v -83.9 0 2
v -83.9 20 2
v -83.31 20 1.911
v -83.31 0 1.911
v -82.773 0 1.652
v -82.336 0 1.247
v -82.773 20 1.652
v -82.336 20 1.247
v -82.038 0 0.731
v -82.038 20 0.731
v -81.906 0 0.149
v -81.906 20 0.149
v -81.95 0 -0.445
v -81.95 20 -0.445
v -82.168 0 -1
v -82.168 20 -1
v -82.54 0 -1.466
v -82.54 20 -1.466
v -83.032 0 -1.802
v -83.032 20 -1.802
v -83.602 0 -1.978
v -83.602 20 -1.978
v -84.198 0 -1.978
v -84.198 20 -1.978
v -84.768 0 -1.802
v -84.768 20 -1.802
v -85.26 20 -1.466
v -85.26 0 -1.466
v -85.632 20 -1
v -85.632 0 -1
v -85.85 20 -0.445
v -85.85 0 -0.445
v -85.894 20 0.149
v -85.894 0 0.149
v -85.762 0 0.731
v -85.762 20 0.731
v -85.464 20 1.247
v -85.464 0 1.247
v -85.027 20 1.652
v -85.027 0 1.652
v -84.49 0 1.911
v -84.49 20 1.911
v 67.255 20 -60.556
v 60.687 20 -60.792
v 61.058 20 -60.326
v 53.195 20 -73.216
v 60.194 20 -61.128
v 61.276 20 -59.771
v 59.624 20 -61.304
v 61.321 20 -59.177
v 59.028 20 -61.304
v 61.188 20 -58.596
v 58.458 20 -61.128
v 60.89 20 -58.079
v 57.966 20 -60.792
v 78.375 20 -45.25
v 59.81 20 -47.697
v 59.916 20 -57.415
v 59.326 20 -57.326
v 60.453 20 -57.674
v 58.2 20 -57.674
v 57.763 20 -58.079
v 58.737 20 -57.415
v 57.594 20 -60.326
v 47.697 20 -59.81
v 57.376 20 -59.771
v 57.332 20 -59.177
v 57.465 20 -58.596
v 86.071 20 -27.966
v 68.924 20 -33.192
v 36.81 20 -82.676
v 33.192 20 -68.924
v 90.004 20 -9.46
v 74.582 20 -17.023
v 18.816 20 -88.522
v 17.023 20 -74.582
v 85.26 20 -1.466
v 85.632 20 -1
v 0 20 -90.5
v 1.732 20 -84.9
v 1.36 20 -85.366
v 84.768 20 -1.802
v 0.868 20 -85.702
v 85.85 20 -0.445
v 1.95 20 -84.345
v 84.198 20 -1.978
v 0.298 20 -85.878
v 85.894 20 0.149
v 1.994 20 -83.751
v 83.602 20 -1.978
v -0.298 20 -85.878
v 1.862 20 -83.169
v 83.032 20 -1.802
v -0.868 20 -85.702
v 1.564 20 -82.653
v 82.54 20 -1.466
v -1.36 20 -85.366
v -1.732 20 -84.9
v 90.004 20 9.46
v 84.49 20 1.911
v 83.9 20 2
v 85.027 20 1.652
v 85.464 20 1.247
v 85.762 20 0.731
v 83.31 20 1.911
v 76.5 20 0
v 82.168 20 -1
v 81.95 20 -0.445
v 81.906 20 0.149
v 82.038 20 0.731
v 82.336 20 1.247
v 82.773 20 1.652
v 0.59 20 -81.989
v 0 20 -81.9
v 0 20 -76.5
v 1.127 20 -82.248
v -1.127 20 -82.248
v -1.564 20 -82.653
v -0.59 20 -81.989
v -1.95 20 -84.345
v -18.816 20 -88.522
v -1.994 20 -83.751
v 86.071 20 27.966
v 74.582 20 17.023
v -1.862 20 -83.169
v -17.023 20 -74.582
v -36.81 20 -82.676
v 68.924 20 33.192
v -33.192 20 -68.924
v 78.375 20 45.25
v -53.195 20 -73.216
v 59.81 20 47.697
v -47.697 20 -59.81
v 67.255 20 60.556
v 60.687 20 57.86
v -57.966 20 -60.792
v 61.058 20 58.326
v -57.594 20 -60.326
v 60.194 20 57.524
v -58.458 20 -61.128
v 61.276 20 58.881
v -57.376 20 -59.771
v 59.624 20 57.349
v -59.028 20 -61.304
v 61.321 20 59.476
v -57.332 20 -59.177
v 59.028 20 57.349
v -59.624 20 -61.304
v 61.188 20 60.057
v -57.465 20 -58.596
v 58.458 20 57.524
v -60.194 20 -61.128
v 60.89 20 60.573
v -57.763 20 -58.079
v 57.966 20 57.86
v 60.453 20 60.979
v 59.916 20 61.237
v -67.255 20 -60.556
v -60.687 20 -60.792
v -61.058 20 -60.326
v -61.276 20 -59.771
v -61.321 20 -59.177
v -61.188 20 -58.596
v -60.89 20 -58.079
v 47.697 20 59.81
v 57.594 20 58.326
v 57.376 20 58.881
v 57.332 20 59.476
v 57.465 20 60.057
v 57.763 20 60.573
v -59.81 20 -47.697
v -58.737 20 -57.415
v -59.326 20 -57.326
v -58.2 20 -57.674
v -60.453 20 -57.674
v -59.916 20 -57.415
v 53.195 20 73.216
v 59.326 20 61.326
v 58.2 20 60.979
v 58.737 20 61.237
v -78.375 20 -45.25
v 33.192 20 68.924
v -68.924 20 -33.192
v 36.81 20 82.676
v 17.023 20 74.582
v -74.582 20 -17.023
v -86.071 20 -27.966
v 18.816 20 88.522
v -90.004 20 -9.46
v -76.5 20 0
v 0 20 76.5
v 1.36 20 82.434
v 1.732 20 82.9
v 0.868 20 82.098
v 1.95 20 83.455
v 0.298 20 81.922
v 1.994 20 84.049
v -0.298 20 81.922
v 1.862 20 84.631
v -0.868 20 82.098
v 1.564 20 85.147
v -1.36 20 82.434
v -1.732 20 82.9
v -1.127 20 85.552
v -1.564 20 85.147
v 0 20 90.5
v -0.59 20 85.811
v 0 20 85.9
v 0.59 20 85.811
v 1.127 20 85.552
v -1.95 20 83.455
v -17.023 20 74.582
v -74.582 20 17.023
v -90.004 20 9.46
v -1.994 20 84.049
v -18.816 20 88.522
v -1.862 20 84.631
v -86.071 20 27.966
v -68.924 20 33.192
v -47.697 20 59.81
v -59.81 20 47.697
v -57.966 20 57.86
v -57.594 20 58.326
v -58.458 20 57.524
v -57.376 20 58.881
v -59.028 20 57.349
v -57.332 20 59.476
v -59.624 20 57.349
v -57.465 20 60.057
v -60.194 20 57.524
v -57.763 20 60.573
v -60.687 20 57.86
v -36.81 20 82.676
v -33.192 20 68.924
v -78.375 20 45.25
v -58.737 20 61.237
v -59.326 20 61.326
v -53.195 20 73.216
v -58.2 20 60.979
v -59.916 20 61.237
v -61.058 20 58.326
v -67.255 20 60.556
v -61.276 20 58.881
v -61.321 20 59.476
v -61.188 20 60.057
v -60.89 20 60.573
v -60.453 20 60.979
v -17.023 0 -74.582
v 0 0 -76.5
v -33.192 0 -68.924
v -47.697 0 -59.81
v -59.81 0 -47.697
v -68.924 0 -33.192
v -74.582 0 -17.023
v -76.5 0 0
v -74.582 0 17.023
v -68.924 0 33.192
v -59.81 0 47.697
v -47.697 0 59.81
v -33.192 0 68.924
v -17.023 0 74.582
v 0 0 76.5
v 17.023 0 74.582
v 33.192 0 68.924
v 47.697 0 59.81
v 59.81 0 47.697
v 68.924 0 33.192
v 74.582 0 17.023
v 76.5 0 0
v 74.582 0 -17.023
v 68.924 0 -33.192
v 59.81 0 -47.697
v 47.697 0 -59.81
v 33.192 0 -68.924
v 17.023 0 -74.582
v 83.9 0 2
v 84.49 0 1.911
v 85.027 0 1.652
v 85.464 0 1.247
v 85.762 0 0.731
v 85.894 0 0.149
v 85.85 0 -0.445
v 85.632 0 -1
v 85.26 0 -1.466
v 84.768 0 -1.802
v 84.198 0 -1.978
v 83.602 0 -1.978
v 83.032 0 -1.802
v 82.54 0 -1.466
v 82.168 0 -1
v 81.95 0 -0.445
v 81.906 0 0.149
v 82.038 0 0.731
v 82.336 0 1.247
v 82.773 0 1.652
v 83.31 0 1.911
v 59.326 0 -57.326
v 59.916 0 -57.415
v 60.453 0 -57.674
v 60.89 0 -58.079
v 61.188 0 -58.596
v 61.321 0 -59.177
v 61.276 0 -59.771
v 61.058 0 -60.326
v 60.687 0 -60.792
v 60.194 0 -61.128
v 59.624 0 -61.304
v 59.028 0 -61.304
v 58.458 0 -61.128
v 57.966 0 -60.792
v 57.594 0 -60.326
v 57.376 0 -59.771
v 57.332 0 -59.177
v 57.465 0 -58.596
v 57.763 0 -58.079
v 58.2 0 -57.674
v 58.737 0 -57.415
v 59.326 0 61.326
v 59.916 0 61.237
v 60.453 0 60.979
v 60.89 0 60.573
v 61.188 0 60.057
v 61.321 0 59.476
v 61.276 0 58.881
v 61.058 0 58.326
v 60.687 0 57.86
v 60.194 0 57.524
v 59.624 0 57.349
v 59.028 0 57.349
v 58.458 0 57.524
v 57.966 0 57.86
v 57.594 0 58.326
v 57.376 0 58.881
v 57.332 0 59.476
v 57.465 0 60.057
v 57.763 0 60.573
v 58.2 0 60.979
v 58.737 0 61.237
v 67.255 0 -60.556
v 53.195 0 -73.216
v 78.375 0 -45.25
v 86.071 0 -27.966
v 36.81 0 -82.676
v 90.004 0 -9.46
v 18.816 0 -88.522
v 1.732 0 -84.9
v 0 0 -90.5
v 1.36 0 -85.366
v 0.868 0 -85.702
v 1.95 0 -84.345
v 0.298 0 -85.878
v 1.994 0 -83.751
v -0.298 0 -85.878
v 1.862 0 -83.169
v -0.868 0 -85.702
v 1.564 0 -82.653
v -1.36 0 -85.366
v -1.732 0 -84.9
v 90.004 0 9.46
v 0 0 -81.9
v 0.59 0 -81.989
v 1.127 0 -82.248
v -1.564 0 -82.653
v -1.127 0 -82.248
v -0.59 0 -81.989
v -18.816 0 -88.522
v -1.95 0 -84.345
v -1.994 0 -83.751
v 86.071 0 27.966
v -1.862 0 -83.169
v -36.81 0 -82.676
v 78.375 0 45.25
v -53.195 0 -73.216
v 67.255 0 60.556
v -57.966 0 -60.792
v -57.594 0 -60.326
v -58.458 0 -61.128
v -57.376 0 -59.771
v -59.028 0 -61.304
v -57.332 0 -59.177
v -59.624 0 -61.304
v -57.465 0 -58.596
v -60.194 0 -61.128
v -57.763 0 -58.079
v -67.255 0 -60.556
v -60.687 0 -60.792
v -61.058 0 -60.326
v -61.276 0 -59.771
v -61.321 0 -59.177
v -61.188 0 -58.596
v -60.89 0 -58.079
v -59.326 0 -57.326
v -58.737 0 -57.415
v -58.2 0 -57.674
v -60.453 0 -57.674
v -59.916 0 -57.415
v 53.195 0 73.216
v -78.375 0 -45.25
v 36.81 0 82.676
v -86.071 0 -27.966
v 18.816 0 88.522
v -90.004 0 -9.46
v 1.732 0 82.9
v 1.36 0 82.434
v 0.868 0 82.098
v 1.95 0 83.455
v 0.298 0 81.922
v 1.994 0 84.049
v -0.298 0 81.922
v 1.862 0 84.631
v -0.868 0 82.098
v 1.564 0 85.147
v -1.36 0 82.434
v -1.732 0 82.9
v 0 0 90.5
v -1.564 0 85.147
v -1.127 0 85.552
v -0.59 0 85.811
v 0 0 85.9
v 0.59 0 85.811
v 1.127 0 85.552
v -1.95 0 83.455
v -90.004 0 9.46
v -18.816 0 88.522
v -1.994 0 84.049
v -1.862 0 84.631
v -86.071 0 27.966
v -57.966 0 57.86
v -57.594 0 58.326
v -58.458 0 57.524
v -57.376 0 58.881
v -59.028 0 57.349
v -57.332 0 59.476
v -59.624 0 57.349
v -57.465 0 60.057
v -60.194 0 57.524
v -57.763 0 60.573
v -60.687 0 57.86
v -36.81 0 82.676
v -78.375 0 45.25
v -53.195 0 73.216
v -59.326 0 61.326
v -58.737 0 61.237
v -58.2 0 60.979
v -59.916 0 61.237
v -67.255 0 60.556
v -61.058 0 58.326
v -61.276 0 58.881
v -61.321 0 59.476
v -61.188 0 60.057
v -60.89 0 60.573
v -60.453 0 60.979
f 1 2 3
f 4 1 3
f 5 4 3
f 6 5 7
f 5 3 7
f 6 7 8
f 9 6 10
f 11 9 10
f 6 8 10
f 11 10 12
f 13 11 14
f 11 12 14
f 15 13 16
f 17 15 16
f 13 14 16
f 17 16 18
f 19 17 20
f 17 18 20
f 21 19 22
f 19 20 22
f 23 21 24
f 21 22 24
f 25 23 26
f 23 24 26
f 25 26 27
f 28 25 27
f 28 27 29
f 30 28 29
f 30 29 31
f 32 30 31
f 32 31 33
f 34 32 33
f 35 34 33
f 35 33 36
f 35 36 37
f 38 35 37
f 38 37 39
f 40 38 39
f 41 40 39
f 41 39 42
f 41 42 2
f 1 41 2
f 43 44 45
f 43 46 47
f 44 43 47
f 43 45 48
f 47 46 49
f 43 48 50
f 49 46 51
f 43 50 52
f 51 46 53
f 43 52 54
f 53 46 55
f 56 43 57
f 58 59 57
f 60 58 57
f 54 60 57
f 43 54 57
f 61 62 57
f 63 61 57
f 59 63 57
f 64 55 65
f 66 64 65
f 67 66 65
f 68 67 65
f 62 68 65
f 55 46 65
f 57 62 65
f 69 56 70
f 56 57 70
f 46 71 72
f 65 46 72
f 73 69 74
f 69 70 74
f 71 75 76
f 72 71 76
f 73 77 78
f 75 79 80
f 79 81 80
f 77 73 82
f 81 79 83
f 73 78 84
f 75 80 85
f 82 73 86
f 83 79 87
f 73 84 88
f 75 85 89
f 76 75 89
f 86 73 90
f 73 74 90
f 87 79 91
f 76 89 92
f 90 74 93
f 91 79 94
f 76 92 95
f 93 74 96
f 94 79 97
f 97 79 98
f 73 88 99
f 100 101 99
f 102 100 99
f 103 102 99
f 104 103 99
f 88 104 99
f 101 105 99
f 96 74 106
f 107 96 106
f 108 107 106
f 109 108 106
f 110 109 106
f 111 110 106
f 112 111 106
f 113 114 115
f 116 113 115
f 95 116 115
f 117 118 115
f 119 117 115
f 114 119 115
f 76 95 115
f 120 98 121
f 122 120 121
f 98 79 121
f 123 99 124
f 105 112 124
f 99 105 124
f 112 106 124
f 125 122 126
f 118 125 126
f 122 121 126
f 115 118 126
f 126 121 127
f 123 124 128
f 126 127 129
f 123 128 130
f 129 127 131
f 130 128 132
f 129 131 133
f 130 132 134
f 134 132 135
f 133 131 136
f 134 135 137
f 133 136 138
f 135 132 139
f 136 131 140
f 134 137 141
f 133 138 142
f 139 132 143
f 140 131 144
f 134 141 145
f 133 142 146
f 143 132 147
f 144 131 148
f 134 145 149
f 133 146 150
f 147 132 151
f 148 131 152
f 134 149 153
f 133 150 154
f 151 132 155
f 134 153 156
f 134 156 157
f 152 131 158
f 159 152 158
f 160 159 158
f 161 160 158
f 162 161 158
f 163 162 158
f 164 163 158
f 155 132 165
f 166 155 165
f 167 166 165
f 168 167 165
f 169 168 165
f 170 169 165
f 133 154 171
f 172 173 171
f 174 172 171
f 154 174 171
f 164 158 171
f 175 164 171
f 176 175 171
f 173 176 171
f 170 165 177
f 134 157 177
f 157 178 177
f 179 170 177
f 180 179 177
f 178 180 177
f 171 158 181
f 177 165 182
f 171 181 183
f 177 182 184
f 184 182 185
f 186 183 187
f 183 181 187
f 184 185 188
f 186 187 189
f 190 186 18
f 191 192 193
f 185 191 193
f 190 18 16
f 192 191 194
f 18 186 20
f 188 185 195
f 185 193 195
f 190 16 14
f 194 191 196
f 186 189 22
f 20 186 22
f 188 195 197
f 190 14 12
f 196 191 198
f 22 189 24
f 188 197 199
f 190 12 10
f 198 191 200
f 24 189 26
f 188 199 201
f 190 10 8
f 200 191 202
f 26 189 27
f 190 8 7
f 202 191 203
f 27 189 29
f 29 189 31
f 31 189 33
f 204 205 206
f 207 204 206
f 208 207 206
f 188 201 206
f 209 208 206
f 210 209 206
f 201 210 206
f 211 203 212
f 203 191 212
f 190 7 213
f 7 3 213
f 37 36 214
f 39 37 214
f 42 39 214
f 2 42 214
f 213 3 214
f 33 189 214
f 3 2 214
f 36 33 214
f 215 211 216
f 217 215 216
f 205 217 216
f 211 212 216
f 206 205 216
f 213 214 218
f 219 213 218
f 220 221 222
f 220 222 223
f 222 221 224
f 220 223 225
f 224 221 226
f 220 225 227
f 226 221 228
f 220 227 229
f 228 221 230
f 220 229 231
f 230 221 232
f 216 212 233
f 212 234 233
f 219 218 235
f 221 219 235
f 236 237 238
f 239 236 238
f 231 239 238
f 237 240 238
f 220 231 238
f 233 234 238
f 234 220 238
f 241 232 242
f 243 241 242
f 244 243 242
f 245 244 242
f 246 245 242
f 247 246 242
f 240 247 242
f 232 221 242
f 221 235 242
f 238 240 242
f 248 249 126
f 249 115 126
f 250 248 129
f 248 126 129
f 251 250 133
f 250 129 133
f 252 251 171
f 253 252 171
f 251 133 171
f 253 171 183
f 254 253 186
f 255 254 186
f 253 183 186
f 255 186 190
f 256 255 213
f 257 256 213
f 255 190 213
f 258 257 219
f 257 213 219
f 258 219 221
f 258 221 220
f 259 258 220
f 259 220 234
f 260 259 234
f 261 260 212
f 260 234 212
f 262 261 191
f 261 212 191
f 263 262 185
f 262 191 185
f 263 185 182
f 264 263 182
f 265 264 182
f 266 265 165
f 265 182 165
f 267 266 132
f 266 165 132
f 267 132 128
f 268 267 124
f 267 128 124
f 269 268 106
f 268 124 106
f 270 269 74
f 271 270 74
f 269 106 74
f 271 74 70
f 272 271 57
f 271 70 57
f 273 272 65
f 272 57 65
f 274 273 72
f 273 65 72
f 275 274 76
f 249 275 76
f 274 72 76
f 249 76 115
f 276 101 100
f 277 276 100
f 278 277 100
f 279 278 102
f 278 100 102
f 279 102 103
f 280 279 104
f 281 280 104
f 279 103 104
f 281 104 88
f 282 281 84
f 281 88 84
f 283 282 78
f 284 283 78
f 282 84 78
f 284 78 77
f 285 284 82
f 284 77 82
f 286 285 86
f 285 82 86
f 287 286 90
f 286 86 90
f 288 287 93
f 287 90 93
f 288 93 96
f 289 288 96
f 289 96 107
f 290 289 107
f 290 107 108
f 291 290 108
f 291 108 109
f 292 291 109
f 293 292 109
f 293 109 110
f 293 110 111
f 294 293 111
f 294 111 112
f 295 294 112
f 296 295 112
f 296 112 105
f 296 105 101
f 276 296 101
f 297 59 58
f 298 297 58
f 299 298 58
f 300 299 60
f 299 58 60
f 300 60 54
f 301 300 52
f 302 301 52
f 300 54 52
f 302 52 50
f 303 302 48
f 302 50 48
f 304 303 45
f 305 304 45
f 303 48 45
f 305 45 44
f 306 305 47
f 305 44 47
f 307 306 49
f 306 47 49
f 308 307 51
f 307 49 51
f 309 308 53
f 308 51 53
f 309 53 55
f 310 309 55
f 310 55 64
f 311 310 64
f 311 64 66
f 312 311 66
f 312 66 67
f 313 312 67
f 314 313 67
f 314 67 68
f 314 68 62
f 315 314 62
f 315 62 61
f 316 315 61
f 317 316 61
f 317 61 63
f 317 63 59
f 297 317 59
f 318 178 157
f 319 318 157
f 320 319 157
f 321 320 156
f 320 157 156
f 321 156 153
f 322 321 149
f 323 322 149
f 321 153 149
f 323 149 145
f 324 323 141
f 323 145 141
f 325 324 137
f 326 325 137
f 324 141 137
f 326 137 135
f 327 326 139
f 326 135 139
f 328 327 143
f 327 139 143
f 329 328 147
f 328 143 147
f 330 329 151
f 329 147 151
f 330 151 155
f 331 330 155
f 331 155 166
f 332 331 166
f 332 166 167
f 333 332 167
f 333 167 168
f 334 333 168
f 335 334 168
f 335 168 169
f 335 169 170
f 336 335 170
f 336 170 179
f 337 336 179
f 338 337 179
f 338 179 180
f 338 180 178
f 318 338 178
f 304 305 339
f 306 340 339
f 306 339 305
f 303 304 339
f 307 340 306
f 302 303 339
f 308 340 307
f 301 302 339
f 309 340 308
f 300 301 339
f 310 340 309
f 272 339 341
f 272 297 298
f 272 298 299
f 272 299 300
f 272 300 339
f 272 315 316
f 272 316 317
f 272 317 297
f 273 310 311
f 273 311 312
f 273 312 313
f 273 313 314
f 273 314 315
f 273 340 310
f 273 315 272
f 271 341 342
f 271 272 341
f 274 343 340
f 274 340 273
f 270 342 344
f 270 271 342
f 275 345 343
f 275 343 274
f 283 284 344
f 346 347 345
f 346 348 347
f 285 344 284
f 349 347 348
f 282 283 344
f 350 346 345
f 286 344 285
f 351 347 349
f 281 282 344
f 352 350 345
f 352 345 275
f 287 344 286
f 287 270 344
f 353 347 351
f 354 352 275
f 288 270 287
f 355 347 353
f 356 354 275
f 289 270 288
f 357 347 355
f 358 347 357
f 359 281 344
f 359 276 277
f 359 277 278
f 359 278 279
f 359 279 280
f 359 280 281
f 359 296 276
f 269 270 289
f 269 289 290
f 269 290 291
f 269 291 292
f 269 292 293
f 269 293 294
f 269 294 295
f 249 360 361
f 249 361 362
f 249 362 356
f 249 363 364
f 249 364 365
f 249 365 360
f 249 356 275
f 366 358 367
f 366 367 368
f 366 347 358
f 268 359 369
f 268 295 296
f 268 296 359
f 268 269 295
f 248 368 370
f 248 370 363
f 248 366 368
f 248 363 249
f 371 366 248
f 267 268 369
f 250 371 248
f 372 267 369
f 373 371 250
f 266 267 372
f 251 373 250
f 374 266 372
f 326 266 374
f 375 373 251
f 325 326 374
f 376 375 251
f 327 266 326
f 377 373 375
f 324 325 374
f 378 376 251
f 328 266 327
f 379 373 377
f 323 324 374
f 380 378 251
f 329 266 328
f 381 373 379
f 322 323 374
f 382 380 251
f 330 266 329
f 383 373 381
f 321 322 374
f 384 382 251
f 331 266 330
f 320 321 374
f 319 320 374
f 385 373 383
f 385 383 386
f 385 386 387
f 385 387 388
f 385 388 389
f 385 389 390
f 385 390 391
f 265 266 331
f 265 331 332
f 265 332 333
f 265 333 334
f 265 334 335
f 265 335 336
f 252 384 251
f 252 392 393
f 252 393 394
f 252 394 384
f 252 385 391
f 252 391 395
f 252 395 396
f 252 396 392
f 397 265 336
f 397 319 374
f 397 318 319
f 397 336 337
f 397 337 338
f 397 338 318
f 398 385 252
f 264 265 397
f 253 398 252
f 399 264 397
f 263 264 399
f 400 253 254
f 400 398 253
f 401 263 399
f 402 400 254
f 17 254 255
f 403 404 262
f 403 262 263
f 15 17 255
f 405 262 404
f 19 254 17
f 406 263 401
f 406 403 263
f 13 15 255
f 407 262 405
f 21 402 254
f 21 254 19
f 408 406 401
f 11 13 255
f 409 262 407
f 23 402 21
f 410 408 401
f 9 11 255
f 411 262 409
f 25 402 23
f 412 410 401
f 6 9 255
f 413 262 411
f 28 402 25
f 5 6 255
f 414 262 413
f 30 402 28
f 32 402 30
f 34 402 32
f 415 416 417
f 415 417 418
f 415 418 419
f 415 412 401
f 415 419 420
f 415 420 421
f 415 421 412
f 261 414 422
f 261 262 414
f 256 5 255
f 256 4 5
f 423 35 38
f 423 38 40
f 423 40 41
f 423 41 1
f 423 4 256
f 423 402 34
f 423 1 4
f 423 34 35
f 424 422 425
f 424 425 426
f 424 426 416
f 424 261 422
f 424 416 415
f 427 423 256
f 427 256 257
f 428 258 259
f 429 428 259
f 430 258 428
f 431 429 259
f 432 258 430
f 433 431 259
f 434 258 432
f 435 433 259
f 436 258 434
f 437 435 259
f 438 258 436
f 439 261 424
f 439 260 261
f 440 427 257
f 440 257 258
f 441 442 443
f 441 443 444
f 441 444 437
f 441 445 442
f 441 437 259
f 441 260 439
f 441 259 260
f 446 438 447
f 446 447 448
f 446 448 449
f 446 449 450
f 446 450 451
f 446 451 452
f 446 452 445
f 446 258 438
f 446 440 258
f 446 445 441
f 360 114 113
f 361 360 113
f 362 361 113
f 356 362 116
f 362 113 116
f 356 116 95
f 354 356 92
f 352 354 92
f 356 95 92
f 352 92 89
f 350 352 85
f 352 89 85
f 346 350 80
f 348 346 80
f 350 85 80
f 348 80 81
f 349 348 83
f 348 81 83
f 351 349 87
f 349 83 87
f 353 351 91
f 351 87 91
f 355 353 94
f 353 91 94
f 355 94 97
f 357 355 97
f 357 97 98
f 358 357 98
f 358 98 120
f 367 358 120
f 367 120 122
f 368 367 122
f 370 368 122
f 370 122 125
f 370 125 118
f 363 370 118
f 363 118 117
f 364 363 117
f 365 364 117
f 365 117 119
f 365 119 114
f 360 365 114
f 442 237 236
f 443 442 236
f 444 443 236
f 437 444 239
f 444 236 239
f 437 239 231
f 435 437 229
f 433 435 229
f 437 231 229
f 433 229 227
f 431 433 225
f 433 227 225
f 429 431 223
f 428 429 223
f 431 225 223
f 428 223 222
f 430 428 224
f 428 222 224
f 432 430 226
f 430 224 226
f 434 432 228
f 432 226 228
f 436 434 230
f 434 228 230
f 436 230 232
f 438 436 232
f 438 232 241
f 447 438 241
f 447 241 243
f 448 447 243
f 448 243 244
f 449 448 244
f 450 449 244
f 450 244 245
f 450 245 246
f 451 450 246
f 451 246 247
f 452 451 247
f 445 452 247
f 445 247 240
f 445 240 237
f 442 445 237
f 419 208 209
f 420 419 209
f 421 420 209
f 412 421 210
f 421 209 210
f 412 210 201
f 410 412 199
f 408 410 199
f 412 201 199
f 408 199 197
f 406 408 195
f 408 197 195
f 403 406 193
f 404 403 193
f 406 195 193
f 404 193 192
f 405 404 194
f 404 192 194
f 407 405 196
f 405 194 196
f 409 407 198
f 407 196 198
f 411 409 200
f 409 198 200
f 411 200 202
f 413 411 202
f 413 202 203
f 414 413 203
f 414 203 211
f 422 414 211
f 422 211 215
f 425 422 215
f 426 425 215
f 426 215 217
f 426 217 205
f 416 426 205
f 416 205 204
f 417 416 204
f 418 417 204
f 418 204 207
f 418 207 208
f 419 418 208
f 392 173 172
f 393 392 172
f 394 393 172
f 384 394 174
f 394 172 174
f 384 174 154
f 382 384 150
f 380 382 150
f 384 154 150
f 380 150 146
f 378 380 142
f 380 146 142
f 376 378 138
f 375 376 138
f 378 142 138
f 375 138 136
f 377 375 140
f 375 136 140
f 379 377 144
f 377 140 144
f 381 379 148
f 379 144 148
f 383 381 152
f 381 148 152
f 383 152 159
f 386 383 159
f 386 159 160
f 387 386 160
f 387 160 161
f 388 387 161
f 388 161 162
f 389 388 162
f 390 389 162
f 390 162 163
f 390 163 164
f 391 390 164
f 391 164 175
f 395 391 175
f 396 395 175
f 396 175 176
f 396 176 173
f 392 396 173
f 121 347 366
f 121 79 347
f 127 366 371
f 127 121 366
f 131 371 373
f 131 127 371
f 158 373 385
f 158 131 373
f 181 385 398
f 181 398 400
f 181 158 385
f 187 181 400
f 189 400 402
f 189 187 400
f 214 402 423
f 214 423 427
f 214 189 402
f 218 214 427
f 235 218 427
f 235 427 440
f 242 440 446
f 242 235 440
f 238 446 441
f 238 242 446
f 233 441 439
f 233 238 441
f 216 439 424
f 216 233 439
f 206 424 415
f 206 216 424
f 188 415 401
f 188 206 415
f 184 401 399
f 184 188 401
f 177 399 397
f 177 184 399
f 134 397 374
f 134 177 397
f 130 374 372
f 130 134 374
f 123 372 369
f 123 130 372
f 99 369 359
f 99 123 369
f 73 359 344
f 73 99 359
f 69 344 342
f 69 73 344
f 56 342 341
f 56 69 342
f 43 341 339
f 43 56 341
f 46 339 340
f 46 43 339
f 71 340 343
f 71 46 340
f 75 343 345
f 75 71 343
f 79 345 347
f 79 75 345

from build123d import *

# Parameters (mm, degrees)
SKETCH_1_W          = 14
SKETCH_1_H          = 20
SKETCH_2_R          = 2
CUT_EXTRUDE_1_DEPTH = 130.539569244


with BuildPart() as part:
    # 草图1 → 旋转1 (revolve)
    with BuildSketch(Plane.XY, mode=Mode.PRIVATE) as revolve_1_sk:
        with Locations((83.5, 10)):
            Rectangle(SKETCH_1_W, SKETCH_1_H)
    revolve(revolve_1_sk.sketch.rotate(Axis((0, 0, 0), (0, 1, 0)), 90), axis=Axis((0, 0, 0), (0, 1, 0)))

    # 草图2 → 切除-拉伸1 (cut, through all)
    with BuildSketch(Plane(origin=(0, 20, 0), x_dir=(1, 0, 0), z_dir=(0, 1, 0))):
        with Locations(Location((-83.9, 0, 0), (0, 0, 270))):
            Circle(SKETCH_2_R)
        with Locations(Location((-59.326258942, 59.326258942, 0), (0, 0, 270))):
            Circle(SKETCH_2_R)
        with Locations(Location((0, 83.9, 0), (0, 0, 270))):
            Circle(SKETCH_2_R)
        with Locations(Location((59.326258942, 59.326258942, 0), (0, 0, 270))):
            Circle(SKETCH_2_R)
        with Locations(Location((83.9, 0, 0), (0, 0, 270))):
            Circle(SKETCH_2_R)
        with Locations(Location((59.326258942, -59.326258942, 0), (0, 0, 270))):
            Circle(SKETCH_2_R)
        with Locations(Location((0, -83.9, 0), (0, 0, 270))):
            Circle(SKETCH_2_R)
        with Locations(Location((-59.326258942, -59.326258942, 0), (0, 0, 270))):
            Circle(SKETCH_2_R)
    extrude(amount=-CUT_EXTRUDE_1_DEPTH, mode=Mode.SUBTRACT)


solid = part.part
